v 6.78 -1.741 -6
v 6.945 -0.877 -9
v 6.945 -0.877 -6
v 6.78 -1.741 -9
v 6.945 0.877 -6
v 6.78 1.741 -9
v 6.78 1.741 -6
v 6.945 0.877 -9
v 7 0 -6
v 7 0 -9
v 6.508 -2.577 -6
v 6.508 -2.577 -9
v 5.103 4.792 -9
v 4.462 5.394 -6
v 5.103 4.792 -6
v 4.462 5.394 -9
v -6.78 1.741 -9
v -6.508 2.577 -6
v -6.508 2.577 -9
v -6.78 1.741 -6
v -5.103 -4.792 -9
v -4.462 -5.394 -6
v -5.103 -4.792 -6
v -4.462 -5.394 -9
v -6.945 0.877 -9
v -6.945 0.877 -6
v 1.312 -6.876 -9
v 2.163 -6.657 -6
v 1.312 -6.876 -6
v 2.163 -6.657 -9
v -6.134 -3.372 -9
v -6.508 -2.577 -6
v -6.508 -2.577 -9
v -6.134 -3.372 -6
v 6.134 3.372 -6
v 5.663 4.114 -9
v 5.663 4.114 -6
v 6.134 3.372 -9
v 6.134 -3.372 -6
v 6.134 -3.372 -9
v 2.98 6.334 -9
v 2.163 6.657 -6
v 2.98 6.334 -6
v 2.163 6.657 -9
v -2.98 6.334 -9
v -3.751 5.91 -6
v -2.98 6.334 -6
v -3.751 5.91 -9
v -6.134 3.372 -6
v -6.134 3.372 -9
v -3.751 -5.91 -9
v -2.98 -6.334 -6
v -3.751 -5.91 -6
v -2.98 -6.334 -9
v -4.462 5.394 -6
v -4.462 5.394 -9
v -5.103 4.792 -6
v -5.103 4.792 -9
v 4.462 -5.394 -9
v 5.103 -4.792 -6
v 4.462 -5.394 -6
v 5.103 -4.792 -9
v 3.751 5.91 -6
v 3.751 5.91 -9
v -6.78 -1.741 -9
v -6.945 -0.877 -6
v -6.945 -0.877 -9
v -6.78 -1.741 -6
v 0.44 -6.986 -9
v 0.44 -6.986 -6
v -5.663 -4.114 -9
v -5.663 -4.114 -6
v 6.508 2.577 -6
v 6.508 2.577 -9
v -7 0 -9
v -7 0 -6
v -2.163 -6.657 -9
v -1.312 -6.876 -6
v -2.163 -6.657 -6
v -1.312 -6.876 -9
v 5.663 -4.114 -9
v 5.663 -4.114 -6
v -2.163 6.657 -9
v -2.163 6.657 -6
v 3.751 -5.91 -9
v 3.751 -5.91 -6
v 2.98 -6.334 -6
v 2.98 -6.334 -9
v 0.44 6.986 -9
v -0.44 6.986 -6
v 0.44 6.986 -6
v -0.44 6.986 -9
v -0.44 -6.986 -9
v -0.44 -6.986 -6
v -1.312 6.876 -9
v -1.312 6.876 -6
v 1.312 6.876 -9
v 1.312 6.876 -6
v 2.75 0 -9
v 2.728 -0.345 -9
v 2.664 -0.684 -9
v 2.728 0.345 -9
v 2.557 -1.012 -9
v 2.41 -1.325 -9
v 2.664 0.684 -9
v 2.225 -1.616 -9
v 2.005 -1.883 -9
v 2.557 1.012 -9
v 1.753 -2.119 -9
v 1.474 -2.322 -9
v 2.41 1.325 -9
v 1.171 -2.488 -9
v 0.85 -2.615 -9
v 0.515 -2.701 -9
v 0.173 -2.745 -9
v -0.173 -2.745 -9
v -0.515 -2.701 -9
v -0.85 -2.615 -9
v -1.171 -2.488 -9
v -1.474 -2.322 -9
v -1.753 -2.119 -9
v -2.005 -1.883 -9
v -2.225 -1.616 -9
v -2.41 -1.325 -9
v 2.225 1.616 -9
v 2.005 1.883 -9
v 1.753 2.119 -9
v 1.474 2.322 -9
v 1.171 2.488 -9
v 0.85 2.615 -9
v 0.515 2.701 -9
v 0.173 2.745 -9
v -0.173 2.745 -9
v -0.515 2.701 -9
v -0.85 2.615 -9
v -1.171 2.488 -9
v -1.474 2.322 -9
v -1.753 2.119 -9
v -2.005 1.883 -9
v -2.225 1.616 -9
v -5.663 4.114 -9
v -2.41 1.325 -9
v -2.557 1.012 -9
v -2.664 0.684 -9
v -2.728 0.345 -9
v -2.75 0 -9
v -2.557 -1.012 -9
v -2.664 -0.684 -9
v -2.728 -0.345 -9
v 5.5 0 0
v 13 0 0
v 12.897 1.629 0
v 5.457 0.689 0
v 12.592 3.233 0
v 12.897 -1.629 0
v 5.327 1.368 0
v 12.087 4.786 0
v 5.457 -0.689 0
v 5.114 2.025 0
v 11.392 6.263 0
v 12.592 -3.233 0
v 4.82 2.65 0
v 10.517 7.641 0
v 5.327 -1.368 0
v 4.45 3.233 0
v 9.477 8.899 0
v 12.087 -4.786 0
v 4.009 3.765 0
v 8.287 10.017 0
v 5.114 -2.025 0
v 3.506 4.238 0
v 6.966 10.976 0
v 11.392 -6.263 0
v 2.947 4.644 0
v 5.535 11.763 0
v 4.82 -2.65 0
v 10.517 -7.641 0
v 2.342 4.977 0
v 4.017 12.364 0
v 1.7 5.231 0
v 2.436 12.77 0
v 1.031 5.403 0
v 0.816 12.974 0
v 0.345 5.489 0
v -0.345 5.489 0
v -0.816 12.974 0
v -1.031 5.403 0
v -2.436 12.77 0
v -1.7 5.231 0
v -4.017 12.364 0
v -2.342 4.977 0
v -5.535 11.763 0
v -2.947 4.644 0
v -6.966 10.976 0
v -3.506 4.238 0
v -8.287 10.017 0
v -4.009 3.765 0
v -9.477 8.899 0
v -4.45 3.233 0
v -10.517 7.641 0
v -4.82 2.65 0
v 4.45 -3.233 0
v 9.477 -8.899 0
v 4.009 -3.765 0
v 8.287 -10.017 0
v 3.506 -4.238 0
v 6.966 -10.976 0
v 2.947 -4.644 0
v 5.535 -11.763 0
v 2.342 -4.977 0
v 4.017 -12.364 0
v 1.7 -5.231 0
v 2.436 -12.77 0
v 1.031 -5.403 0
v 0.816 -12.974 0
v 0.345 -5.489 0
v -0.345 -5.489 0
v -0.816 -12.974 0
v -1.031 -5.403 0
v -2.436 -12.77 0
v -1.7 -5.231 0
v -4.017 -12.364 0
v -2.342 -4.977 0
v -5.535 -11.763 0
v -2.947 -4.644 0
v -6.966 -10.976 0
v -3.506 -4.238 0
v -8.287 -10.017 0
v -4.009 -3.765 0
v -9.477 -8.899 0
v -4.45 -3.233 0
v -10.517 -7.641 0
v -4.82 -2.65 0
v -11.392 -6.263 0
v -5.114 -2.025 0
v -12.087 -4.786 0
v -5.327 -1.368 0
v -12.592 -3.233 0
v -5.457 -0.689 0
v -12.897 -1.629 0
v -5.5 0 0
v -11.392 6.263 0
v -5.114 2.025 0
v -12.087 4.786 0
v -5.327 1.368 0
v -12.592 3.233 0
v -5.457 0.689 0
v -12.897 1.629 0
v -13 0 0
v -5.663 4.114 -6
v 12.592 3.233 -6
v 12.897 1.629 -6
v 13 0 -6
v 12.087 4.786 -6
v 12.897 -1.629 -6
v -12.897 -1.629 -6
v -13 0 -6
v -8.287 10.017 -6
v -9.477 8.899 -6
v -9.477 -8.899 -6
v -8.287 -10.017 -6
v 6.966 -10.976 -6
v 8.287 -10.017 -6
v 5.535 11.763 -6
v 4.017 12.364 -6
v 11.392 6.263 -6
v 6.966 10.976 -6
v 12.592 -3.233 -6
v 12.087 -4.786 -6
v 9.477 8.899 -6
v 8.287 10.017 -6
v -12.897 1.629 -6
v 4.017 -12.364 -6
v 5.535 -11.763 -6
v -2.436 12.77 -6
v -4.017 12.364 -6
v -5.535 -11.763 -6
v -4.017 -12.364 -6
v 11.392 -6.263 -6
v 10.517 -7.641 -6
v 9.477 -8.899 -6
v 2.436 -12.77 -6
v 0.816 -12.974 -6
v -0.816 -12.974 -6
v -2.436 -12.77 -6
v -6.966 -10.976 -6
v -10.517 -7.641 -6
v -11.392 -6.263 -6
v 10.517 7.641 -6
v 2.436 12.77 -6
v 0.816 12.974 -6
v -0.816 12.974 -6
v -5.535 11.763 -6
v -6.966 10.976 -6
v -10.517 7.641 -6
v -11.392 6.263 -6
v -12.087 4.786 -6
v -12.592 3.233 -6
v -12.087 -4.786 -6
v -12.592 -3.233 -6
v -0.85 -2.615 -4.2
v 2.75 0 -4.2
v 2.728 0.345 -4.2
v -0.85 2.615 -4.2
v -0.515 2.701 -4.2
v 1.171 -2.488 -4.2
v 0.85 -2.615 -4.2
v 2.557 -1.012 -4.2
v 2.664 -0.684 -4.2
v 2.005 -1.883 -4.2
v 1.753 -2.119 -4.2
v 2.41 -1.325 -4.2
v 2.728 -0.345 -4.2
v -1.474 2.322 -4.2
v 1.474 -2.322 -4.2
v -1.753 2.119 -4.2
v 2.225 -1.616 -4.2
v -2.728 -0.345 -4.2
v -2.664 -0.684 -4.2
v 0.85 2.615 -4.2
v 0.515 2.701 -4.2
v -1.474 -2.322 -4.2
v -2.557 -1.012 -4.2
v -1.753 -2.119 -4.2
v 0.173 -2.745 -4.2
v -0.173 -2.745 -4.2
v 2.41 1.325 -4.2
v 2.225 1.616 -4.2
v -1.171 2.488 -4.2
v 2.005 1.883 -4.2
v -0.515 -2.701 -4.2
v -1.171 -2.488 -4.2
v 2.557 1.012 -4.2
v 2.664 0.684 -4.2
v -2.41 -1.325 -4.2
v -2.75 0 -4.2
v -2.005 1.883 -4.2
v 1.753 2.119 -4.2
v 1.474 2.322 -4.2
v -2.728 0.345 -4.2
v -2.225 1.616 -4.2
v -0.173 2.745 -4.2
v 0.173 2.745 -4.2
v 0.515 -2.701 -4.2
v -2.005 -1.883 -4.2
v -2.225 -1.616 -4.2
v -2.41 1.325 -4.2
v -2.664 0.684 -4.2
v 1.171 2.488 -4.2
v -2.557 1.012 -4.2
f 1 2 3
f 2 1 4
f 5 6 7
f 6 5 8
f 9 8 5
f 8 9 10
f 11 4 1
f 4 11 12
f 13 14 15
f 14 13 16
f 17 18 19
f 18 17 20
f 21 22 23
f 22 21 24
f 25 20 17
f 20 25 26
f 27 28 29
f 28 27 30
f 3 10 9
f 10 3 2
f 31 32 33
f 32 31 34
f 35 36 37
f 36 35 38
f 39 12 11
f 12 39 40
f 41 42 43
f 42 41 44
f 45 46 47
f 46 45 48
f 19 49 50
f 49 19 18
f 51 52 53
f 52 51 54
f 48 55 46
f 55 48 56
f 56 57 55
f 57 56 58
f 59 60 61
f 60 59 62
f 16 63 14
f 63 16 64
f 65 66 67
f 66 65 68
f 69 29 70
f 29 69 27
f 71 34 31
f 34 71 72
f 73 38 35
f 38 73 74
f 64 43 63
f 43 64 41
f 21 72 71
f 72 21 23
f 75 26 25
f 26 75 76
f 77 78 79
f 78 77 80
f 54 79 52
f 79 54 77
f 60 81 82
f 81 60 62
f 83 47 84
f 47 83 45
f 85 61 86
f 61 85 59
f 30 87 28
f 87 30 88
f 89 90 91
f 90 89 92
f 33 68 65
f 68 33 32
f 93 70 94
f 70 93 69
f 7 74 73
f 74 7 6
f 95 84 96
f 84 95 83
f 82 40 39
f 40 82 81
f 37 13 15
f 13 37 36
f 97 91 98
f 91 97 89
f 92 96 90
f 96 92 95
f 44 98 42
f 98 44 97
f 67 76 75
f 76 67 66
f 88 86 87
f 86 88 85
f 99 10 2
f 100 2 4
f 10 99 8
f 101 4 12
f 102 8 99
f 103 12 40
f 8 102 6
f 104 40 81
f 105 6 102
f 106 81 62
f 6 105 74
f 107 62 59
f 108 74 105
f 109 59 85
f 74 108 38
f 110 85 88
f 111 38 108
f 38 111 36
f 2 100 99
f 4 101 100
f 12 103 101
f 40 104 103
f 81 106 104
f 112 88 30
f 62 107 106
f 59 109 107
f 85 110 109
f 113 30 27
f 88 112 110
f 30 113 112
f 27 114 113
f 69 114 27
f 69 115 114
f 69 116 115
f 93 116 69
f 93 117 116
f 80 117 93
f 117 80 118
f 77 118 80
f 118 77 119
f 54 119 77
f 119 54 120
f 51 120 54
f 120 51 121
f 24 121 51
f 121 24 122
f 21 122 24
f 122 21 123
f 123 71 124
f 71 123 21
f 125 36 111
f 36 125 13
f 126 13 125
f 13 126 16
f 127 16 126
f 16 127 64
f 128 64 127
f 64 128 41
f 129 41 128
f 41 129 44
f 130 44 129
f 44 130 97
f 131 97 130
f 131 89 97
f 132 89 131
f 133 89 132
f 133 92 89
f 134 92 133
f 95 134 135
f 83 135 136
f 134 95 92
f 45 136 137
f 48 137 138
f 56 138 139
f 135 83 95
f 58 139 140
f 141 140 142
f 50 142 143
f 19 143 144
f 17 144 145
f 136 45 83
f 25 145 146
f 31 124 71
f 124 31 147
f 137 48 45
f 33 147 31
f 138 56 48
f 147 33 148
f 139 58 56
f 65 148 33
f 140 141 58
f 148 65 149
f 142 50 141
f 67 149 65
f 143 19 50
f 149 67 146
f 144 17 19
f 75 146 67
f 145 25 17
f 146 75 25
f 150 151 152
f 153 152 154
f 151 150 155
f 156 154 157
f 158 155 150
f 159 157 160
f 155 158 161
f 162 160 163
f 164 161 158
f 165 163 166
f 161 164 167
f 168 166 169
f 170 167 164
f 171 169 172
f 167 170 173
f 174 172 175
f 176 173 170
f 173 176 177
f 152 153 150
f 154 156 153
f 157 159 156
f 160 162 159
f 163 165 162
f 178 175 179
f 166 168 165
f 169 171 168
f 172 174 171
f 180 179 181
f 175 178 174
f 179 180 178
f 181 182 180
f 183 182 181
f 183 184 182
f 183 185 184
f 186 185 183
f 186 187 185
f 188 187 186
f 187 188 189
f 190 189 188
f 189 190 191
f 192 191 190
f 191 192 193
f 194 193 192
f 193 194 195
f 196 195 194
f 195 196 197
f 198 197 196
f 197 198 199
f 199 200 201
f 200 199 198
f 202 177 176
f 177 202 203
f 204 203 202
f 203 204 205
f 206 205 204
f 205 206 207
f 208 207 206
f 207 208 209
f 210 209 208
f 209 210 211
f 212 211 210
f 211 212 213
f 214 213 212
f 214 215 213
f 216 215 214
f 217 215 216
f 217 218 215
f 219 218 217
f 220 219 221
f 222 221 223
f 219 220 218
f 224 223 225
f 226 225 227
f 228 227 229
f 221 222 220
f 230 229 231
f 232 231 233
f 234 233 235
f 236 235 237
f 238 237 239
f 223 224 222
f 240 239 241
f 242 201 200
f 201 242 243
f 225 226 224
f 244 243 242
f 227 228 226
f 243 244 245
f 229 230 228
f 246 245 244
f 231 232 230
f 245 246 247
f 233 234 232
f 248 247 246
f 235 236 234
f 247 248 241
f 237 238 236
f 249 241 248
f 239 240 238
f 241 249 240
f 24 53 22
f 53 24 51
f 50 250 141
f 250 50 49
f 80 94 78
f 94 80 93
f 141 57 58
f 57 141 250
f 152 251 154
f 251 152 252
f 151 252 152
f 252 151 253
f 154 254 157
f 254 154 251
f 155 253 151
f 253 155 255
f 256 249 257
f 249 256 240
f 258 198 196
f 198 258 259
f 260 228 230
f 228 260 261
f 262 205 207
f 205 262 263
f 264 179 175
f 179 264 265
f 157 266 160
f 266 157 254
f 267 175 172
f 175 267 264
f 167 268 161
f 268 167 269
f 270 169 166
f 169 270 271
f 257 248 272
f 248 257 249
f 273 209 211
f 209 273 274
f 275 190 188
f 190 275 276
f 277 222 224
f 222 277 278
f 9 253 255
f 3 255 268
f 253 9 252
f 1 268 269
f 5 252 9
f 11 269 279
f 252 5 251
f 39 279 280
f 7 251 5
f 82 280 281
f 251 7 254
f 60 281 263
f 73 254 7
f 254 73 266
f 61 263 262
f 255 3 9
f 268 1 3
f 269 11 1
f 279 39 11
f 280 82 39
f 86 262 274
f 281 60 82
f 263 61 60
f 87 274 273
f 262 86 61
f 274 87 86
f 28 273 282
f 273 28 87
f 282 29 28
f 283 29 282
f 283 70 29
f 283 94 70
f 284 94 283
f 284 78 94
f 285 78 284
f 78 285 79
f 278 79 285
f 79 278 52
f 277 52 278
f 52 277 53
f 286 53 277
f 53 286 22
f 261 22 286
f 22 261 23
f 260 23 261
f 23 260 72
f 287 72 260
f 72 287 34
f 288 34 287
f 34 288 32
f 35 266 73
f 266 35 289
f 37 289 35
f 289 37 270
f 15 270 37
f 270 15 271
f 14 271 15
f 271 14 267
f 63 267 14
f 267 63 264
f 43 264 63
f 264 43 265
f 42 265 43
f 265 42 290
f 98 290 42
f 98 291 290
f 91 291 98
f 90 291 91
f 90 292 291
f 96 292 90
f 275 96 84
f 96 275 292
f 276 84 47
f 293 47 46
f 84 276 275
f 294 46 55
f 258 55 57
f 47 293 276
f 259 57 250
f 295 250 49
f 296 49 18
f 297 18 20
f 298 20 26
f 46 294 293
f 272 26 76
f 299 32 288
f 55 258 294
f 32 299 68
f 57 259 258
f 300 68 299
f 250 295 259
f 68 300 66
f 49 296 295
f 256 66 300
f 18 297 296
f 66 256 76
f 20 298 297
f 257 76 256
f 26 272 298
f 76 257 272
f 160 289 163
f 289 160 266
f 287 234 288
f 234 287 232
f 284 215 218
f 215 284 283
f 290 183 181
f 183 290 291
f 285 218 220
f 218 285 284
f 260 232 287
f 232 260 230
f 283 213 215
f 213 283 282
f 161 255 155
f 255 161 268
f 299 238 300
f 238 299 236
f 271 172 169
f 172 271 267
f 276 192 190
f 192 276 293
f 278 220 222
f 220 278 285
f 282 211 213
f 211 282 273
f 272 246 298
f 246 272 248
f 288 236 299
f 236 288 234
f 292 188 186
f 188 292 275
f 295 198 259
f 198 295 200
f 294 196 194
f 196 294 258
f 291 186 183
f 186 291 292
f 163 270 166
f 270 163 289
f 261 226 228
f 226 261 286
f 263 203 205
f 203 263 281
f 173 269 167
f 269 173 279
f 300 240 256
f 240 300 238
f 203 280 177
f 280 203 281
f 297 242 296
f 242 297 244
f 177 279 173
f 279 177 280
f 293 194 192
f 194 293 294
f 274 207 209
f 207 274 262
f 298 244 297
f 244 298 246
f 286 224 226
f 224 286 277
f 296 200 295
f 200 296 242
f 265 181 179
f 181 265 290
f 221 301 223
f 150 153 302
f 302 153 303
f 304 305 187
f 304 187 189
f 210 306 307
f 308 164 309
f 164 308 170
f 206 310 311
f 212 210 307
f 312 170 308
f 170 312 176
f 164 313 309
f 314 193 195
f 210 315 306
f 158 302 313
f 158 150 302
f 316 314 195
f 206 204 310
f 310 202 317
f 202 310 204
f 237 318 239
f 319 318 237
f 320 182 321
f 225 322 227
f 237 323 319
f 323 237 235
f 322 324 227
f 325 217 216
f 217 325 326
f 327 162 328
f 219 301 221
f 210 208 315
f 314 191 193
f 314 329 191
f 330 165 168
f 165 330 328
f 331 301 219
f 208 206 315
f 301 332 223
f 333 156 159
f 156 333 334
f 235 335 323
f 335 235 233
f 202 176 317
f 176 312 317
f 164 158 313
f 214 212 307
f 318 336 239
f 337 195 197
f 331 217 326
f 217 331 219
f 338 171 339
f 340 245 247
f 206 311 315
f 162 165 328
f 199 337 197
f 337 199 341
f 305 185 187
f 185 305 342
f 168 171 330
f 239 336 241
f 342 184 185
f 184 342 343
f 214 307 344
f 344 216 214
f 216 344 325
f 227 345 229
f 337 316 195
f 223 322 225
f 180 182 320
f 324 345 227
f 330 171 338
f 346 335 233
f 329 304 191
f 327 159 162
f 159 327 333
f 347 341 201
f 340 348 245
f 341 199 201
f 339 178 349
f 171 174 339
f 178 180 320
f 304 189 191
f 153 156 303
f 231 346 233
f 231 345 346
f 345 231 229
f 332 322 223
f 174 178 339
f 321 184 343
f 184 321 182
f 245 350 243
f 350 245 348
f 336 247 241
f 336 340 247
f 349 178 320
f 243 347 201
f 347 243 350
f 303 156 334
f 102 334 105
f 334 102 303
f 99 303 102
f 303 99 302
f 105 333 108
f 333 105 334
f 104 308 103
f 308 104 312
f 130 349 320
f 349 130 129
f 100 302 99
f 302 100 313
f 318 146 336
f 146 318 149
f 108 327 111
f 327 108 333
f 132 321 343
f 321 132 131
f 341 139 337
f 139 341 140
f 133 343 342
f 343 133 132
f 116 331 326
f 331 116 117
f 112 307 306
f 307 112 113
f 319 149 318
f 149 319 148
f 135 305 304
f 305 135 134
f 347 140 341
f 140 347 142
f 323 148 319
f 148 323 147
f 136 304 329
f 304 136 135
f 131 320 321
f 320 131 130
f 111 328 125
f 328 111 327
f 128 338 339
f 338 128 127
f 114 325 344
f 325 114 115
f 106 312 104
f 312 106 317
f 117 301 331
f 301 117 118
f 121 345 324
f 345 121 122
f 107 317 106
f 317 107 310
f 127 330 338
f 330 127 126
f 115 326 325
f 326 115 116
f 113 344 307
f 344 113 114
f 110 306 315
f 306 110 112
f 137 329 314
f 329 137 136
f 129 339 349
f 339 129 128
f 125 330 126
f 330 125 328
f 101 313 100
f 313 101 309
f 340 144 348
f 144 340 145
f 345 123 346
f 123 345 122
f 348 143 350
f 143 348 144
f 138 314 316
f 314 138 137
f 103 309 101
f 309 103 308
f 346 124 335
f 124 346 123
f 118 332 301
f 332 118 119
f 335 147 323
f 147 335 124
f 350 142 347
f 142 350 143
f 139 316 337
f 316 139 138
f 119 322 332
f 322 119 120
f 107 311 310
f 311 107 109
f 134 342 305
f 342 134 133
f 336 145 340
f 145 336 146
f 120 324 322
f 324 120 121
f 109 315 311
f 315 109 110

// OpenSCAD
$fn = 50;


difference() {
	union() {
		translate(v = [0, 0, -9.0000000000]) {
			cylinder(h = 9, r = 7.0000000000);
		}
		translate(v = [0, 0, -6.0000000000]) {
			cylinder(h = 6, r = 13.0000000000);
		}
	}
	union() {
		translate(v = [0, 0, 0]) {
			rotate(a = [0, 0, 0]) {
				difference() {
					union() {
						#translate(v = [0, 0, -9.0000000000]) {
							cylinder(h = 9, r = 2.2500000000);
						}
						#translate(v = [0, 0, -4.2000000000]) {
							cylinder(h = 4.2000000000, r = 7.0000000000, r1 = 2.7500000000, r2 = 5.5000000000);
						}
						#translate(v = [0, 0, -9.0000000000]) {
							cylinder(h = 9, r = 2.7500000000);
						}
						#translate(v = [0, 0, -9.0000000000]) {
							cylinder(h = 9, r = 2.2500000000);
						}
					}
					union();
				}
			}
		}
	}
}
